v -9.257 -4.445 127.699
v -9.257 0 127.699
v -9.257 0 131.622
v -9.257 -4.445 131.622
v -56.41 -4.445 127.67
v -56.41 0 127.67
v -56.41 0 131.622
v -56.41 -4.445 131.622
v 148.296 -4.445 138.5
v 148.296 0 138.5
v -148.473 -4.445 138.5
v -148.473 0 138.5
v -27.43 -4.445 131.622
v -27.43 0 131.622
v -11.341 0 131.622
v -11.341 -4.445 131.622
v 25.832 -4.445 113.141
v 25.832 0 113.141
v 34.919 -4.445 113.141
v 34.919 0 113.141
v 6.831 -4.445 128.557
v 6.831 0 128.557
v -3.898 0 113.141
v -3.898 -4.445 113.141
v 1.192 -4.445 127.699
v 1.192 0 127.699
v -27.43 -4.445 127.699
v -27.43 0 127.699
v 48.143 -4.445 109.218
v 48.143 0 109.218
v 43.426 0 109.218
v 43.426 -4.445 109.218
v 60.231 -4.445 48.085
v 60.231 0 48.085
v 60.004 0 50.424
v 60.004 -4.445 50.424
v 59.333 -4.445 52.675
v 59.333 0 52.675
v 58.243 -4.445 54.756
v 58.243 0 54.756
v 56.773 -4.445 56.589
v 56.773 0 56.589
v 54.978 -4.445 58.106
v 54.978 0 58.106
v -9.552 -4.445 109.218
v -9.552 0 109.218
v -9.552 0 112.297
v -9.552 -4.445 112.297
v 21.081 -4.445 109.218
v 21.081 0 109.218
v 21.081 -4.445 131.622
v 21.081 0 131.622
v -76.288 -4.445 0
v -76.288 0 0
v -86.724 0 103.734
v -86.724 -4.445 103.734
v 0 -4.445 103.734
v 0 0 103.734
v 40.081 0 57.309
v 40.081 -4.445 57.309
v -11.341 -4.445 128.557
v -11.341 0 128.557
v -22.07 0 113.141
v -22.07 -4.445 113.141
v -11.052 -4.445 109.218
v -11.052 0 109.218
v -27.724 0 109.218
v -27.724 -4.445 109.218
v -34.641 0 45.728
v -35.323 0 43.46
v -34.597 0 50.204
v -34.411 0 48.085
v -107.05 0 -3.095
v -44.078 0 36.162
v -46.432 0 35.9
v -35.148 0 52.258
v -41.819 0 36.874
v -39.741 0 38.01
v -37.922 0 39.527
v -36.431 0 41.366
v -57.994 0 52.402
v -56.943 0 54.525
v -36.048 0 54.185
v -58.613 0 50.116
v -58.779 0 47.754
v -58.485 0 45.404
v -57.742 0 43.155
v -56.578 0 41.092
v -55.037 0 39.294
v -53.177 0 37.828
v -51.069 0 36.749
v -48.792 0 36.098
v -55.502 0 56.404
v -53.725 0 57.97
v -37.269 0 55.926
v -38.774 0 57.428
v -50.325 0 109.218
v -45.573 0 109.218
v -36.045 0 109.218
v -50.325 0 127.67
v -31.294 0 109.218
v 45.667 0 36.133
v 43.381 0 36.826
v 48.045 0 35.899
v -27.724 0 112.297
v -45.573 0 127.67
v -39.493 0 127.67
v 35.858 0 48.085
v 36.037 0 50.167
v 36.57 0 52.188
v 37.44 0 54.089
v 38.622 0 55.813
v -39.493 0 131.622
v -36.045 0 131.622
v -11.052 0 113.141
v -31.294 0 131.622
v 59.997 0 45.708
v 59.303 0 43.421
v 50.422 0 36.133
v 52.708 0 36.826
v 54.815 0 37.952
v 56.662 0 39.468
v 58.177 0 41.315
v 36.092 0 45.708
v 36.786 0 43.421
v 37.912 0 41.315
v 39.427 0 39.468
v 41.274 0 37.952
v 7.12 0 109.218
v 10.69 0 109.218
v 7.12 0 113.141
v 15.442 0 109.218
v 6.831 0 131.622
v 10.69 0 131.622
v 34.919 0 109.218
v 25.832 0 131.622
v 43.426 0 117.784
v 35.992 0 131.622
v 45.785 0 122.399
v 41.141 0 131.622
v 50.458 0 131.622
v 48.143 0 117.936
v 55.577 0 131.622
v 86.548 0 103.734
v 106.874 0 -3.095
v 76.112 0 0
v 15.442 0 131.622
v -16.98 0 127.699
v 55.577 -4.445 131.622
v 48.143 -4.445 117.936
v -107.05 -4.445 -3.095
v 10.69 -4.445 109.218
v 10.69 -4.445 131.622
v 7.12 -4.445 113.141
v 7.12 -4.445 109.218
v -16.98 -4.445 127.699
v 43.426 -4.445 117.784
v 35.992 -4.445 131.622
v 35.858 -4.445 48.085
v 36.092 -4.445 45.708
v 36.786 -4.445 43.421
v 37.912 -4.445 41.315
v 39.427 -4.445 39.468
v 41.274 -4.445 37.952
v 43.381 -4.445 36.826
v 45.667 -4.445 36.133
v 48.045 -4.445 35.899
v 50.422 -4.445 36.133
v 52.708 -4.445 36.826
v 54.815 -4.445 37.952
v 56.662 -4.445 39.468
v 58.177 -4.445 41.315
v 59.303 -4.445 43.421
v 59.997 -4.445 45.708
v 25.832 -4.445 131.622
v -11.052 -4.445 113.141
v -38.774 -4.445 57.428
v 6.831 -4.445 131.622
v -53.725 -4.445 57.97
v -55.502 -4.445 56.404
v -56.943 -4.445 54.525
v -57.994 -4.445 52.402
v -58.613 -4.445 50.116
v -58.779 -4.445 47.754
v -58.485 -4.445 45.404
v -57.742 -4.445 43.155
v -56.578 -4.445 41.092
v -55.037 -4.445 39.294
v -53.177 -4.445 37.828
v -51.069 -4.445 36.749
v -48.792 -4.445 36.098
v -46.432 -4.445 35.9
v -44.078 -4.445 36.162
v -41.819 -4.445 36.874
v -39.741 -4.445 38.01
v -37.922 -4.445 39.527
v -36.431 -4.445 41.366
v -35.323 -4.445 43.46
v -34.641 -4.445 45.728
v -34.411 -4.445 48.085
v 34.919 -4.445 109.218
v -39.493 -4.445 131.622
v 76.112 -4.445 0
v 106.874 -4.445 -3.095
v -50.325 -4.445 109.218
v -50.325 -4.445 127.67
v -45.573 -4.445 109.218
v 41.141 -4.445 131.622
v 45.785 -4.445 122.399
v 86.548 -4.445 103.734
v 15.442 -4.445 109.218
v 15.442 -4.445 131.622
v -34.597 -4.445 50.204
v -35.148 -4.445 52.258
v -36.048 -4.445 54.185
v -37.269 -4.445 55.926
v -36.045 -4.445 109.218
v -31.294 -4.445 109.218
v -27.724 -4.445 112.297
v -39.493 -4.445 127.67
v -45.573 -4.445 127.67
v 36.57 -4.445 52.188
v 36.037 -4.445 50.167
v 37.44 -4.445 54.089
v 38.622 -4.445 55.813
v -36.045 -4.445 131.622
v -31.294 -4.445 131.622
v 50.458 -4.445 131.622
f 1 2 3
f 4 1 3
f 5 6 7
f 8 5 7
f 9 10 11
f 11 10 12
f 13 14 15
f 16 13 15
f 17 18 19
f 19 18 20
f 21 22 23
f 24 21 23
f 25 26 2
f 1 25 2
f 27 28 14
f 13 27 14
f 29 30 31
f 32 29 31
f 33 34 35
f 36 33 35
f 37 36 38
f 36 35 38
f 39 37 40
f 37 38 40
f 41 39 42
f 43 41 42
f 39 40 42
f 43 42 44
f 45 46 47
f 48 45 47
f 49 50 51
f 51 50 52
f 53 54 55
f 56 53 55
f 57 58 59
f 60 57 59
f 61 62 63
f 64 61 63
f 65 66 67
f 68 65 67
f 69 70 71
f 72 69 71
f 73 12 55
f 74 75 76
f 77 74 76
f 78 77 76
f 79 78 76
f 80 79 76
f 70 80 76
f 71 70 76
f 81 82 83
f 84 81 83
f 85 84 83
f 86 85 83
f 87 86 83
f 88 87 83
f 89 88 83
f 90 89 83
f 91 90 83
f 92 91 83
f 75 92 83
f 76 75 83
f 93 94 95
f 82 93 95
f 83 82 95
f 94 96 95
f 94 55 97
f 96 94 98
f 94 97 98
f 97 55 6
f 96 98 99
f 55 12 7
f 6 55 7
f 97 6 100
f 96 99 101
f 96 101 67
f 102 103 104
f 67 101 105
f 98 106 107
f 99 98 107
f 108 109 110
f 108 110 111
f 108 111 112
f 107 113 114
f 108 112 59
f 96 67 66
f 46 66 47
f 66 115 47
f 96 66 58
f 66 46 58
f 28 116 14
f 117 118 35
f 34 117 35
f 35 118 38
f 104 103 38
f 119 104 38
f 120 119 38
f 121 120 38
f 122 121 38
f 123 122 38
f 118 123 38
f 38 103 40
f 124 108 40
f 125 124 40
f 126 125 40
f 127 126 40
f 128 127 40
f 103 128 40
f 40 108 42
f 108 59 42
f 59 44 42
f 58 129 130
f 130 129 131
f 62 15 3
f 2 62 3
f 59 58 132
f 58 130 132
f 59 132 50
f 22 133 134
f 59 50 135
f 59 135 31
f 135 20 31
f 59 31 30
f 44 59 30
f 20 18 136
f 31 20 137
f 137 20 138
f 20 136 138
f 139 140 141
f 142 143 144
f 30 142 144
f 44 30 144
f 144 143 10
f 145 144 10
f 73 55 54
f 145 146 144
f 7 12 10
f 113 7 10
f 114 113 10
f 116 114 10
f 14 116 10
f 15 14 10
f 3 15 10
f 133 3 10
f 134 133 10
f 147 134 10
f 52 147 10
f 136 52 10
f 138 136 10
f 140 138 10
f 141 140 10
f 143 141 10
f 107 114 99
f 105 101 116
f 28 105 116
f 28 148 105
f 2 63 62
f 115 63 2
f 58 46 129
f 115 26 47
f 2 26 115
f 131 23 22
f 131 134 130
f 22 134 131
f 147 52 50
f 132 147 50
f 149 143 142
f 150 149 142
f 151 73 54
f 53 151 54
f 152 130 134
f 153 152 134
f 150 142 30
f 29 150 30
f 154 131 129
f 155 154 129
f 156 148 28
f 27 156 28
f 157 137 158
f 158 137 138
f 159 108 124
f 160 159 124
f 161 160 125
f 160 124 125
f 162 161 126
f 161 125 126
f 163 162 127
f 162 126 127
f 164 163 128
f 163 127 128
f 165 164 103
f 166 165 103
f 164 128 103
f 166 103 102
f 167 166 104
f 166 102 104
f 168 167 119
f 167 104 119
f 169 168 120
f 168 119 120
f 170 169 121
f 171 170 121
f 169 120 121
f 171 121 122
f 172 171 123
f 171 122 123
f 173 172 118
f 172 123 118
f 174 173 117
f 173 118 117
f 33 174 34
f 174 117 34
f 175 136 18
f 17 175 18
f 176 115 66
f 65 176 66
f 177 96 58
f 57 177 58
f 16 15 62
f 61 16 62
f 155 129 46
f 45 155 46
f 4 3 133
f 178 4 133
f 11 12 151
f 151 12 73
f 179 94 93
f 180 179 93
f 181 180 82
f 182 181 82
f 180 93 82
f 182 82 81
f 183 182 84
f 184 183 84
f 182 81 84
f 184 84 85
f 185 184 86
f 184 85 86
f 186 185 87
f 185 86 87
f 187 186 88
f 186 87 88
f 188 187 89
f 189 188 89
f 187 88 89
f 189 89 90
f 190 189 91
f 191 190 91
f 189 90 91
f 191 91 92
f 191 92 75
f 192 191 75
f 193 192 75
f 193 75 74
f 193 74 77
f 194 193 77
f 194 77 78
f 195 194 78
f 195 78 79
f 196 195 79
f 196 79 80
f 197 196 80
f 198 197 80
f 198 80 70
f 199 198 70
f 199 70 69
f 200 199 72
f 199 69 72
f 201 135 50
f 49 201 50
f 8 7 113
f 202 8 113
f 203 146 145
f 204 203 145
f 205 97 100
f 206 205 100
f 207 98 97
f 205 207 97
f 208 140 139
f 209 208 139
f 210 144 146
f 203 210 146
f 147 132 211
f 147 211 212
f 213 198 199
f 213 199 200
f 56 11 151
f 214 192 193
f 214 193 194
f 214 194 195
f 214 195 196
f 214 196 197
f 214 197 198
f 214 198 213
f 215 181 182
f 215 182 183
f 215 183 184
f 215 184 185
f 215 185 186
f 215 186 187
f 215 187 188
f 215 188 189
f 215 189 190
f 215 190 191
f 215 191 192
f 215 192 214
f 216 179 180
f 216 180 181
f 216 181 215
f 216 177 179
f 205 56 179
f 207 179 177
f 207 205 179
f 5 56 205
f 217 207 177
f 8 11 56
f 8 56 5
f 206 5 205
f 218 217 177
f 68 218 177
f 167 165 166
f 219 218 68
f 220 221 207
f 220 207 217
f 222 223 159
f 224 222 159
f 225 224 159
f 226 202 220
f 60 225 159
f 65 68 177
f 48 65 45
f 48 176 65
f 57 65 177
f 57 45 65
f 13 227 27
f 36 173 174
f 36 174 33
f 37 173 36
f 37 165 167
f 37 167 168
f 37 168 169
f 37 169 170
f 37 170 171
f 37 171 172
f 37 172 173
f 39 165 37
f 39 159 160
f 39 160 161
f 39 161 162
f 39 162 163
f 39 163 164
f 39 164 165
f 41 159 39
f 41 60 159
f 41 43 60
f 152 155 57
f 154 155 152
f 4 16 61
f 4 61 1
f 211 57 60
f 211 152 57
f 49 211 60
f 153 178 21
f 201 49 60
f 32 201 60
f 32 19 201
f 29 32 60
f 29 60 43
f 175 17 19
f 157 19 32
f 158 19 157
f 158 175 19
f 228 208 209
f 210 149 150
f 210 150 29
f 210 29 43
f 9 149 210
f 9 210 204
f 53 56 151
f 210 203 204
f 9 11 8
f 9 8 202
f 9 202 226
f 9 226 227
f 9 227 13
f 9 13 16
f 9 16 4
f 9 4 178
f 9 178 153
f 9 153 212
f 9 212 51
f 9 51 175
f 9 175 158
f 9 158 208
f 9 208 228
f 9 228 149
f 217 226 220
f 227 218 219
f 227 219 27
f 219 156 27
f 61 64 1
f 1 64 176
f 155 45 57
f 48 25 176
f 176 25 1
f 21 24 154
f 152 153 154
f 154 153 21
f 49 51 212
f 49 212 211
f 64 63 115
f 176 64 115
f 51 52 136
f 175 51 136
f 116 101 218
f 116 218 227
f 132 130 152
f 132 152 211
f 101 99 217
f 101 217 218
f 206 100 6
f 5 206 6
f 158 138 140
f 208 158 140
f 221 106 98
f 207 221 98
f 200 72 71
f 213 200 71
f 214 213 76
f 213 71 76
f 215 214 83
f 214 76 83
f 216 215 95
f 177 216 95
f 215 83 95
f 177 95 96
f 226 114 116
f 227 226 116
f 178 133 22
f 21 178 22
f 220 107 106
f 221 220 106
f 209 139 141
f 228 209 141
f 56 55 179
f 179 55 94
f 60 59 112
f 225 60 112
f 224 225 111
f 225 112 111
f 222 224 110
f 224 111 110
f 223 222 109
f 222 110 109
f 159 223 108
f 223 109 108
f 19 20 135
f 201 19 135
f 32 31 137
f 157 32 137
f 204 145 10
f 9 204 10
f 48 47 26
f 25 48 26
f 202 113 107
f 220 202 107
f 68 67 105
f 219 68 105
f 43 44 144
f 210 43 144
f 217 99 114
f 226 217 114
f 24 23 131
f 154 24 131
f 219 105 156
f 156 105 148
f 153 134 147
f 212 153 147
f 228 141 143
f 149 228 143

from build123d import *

# Parameters (mm, degrees)
F0_W     = 4.7515250481
F0_H     = 22.4042496848
F1_DEPTH = 4.445


with BuildPart() as f1:
    # F0 (on Front) → F1 (new body)
    with BuildSketch(Plane.XZ):
        with BuildLine():
            Line((-107.0503221856, -3.0948602284), (-76.2880815111, 0))
            Line((-76.2880815111, 0), (-86.7243445437, 103.7341952324))
            Line((-86.7243445437, 103.7341952324), (-53.7250275092, 57.9696269721))
            ThreePointArc((-53.7250275092, 57.9696269721), (-46.1566377564, 60.2633619864), (-38.773926276, 57.4283461196))
            Line((-38.773926276, 57.4283461196), (0, 103.7341952324))
            Line((0, 103.7341952324), (40.0807997492, 57.3092244379))
            ThreePointArc((40.0807997492, 57.3092244379), (47.3933296143, 60.2539299742), (54.9783525161, 58.1064171563))
            Line((54.9783525161, 58.1064171563), (86.548257701, 103.7341875683))
            Line((86.548257701, 103.7341875683), (76.1119184889, 0))
            Line((76.1119184889, 0), (106.8741568907, -3.0948828193))
            Line((106.8741568907, -3.0948828193), (148.2956194489, 138.5004273575))
            Line((148.2956194489, 138.5004273575), (-148.4725865748, 138.5004273575))
            Line((-148.4725865748, 138.5004273575), (-107.0503221856, -3.0948602284))
        make_face()
        Polygon((-45.5729805496, 127.6698307823), (-45.5729805496, 109.2178300023), (-50.3245055976, 109.2178300023), (-50.3245055976, 127.6698307823), (-56.4097920627, 127.6698307823), (-56.4097920627, 131.6220796871), (-39.4925976191, 131.6220796871), (-39.4925976191, 127.6698307823), align=None, mode=Mode.SUBTRACT)
        with Locations((-33.6696502563, 120.4199548447)):
            Rectangle(F0_W, F0_H, mode=Mode.SUBTRACT)
        Polygon((-11.0520968155, 113.1406576994), (-11.0520968155, 109.2178300023), (-27.724114528, 109.2178300023), (-27.724114528, 112.2972497445), (-16.9804701727, 127.69925199), (-27.4299024507, 127.69925199), (-27.4299024507, 131.6220796871), (-11.3414053582, 131.6220796871), (-11.3414053582, 128.5573705488), (-22.0703391096, 113.1406576994), align=None, mode=Mode.SUBTRACT)
        Polygon((7.120402491, 113.1406576994), (7.120402491, 109.2178300023), (-9.5516152214, 109.2178300023), (-9.5516152214, 112.2972497445), (1.1920291339, 127.69925199), (-9.2574031441, 127.69925199), (-9.2574031441, 131.6220796871), (6.8310939484, 131.6220796871), (6.8310939484, 128.5573705488), (-3.8978398031, 113.1406576994), align=None, mode=Mode.SUBTRACT)
        with Locations((13.0659382194, 120.4199548447)):
            Rectangle(F0_W, F0_H, mode=Mode.SUBTRACT)
        Polygon((34.9185402592, 109.2178300023), (21.0807655579, 109.2178300023), (21.0807655579, 131.6220796871), (25.832290606, 131.6220796871), (25.832290606, 113.1406576994), (34.9185402592, 113.1406576994), align=None, mode=Mode.SUBTRACT)
        Polygon((41.1411256937, 131.6220796871), (45.7847729801, 122.3985310644), (50.4578414742, 131.6220796871), (55.5771316188, 131.6220796871), (48.1433731329, 117.936314559), (48.1433731329, 109.2178300023), (43.4261728272, 109.2178300023), (43.4261728272, 117.7843049857), (35.9924143413, 131.6220796871), align=None, mode=Mode.SUBTRACT)
        with BuildLine():
            Line((-46.5975366533, 48.0849817395), (-53.7250275092, 57.9696269721))
            ThreePointArc((-53.7250275092, 57.9696269721), (-52.1495262693, 37.2368137569), (-34.411177998, 48.0849817395))
            Line((-34.411177998, 48.0849817395), (-46.5975366533, 48.0849817395))
        make_face()
        with BuildLine():
            ThreePointArc((-38.773926276, 57.4283461196), (-46.1566377564, 60.2633619864), (-53.7250275092, 57.9696269721))
            Line((-53.7250275092, 57.9696269721), (-46.5975366533, 48.0849817395))
            Line((-46.5975366533, 48.0849817395), (-38.773926276, 57.4283461196))
        make_face()
        with BuildLine():
            Line((-38.773926276, 57.4283461196), (-46.5975366533, 48.0849817395))
            Line((-46.5975366533, 48.0849817395), (-34.411177998, 48.0849817395))
            ThreePointArc((-34.411177998, 48.0849817395), (-35.555601603, 53.240852919), (-38.773926276, 57.4283461196))
        make_face()
        with BuildLine():
            ThreePointArc((60.230868841, 48.0849817395), (58.838157085, 53.7422358339), (54.9783525161, 58.1064171563))
            Line((54.9783525161, 58.1064171563), (48.0445101857, 48.0849817395))
            Line((48.0445101857, 48.0849817395), (35.8581515305, 48.0849817395))
            ThreePointArc((35.8581515305, 48.0849817395), (48.0445101857, 35.8986230843), (60.230868841, 48.0849817395))
        make_face()
        with BuildLine():
            Line((48.0445101857, 48.0849817395), (54.9783525161, 58.1064171563))
            ThreePointArc((54.9783525161, 58.1064171563), (47.3933296143, 60.2539299742), (40.0807997492, 57.3092244379))
            Line((40.0807997492, 57.3092244379), (48.0445101857, 48.0849817395))
        make_face()
        with BuildLine():
            Line((48.0445101857, 48.0849817395), (40.0807997492, 57.3092244379))
            ThreePointArc((40.0807997492, 57.3092244379), (36.9639874345, 53.1573926884), (35.8581515305, 48.0849817395))
            Line((35.8581515305, 48.0849817395), (48.0445101857, 48.0849817395))
        make_face()
    extrude(amount=F1_DEPTH)


solid = f1.part
